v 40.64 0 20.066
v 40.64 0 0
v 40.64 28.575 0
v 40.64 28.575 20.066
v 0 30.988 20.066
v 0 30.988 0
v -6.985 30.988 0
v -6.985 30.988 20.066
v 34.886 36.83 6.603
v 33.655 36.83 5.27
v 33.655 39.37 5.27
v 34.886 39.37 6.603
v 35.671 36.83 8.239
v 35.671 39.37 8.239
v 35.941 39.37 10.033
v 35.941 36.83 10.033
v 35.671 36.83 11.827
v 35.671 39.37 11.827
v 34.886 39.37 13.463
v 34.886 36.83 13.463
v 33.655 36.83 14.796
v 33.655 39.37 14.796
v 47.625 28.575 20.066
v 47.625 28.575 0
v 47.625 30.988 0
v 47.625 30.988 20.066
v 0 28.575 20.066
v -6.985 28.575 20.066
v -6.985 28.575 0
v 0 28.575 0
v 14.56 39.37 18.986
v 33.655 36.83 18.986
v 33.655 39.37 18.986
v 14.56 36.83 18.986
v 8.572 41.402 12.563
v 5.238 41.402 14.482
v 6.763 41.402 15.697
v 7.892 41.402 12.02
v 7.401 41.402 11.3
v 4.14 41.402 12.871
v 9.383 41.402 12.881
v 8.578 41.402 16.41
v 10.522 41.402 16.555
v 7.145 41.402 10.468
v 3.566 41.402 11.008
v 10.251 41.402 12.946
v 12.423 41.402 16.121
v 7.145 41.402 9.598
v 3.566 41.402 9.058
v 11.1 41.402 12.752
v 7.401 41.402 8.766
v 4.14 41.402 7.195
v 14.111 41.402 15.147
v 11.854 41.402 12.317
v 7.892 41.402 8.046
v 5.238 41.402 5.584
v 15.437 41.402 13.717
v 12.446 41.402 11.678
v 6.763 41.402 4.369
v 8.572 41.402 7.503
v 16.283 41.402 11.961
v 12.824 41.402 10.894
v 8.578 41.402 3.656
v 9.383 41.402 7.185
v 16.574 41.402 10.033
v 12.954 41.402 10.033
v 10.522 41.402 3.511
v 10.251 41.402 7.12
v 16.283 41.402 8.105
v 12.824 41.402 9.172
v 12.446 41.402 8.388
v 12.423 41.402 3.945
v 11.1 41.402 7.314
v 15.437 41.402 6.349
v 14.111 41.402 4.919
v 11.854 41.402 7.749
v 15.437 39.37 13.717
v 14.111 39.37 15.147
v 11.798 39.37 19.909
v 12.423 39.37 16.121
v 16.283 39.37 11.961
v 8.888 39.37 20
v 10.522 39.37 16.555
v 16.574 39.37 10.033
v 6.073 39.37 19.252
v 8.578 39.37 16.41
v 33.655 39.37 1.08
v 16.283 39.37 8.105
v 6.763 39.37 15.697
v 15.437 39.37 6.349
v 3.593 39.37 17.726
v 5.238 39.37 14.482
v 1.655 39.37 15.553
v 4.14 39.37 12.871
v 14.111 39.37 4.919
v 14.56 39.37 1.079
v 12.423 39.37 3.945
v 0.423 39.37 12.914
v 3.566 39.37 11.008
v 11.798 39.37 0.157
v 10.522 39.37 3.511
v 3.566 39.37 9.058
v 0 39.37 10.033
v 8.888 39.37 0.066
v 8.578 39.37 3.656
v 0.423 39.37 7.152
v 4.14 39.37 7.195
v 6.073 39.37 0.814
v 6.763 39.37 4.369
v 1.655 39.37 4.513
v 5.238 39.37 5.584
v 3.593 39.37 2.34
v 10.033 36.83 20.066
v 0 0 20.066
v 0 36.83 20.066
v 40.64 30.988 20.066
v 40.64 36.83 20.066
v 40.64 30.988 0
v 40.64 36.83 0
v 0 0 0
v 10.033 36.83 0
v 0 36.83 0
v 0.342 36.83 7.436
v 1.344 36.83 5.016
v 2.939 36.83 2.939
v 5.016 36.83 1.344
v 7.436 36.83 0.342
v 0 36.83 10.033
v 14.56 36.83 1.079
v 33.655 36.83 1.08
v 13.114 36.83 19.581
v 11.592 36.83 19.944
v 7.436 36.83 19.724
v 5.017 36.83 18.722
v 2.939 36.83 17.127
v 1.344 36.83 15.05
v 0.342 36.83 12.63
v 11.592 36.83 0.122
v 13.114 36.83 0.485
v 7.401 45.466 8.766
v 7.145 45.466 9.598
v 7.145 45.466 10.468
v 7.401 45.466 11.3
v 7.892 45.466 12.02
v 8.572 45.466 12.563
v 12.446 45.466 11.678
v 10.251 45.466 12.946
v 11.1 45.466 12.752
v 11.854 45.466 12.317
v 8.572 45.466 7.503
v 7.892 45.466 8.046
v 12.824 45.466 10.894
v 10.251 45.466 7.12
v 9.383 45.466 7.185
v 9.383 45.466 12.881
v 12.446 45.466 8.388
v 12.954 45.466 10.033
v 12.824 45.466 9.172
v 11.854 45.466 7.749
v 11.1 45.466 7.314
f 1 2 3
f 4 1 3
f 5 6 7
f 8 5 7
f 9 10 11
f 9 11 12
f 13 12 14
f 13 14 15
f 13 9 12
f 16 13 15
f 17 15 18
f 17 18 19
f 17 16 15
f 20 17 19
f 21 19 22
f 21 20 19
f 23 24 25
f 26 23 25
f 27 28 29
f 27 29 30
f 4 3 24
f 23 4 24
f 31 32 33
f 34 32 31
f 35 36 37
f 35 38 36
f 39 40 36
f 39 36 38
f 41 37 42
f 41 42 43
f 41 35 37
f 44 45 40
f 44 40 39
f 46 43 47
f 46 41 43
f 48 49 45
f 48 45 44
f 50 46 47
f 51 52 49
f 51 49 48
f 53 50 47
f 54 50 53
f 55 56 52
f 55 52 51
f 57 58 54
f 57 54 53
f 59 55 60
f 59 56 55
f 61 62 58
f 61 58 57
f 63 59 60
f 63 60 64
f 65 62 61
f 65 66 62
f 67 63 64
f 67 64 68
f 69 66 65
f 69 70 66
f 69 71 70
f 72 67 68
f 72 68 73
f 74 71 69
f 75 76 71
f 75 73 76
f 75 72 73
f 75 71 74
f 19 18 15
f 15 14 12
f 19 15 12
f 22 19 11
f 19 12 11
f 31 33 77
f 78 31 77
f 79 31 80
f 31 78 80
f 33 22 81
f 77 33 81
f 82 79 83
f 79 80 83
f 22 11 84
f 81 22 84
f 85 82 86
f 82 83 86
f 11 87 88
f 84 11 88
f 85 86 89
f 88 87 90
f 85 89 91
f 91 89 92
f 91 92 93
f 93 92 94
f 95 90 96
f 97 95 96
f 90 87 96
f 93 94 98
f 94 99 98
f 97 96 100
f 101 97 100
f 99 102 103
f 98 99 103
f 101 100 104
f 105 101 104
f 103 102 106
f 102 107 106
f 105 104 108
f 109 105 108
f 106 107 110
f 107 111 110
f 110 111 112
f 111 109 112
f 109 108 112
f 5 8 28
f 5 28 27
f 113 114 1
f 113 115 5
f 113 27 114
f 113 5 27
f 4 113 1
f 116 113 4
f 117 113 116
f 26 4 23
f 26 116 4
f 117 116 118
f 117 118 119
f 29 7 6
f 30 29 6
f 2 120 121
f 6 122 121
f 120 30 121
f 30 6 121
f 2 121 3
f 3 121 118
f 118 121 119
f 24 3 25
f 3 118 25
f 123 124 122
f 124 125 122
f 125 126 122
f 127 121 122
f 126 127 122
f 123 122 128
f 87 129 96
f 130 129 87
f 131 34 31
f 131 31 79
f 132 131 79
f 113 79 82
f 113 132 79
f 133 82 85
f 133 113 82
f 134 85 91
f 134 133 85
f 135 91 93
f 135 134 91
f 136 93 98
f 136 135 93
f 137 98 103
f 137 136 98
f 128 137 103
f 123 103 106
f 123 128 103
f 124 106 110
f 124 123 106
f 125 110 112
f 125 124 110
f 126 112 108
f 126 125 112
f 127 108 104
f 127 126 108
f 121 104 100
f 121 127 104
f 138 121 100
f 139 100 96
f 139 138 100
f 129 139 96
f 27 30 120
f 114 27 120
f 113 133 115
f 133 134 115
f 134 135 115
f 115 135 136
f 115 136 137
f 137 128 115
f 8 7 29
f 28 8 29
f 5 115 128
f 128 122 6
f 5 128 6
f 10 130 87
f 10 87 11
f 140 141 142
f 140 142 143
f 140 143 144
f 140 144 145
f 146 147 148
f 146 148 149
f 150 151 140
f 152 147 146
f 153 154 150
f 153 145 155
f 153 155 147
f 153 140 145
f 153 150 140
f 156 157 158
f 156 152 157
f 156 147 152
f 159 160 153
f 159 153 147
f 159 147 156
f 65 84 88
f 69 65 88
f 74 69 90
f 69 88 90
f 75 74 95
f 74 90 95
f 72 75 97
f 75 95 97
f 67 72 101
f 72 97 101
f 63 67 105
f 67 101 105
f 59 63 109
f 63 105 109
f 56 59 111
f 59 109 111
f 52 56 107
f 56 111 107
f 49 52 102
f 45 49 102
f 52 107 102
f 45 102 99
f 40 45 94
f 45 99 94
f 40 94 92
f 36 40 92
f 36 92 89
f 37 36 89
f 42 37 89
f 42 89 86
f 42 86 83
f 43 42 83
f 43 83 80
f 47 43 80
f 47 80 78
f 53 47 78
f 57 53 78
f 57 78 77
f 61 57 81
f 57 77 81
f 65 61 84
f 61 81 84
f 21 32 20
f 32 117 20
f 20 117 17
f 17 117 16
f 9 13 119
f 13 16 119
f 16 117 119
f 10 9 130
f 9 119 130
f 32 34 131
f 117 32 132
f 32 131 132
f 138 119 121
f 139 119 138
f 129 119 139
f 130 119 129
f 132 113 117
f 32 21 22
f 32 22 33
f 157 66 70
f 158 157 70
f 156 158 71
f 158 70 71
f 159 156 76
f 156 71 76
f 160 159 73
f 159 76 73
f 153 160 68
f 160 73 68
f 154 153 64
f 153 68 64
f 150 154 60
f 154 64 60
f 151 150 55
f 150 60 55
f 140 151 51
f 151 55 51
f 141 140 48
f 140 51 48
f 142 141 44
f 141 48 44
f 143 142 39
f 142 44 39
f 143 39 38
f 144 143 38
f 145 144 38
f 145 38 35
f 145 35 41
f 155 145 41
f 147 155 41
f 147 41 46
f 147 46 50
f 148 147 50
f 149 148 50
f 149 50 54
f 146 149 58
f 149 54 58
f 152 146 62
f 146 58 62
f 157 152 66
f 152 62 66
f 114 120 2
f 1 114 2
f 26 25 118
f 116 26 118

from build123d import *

# Parameters (mm, degrees)
BOSS_EXTRUDE1_DEPTH = 20.066
BOSS_EXTRUDE2_DEPTH = 2.54
SKETCH3_R           = 6.5405
BOSS_EXTRUDE3_DEPTH = 2.032
SKETCH4_R           = 2.921
BOSS_EXTRUDE4_DEPTH = 4.064


with BuildPart() as part:
    # Sketch1 → Boss-Extrude1 (new body)
    with BuildSketch(Plane.XY):
        Polygon((0, 0), (40.64, 0), (40.64, 28.575), (47.625, 28.575), (47.625, 30.988), (40.64, 30.988), (40.64, 36.83), (0, 36.83), (0, 30.988), (-6.985, 30.988), (-6.985, 28.575), (0, 28.575), align=None)
    extrude(amount=BOSS_EXTRUDE1_DEPTH)

    # Sketch2 → Boss-Extrude2 (add)
    with BuildSketch(Plane(origin=(0, 36.83, 0), x_dir=(1, 0, 0), z_dir=(0, 1, 0))):
        with BuildLine():
            Line((14.560242732, -1.0795), (33.655, -1.0795))
            Line((33.655, -1.0795), (33.655, -5.2705))
            ThreePointArc((33.655, -5.2705), (35.941, -10.033), (33.655, -14.7955))
            Line((33.655, -14.7955), (33.655, -18.9865))
            Line((33.655, -18.9865), (14.560242732, -18.9865))
            ThreePointArc((14.560242732, -18.9865), (0, -10.033), (14.560242732, -1.0795))
        make_face()
    extrude(amount=BOSS_EXTRUDE2_DEPTH)

    # Sketch3 → Boss-Extrude3 (add)
    with BuildSketch(Plane(origin=(0, 39.37, 0), x_dir=(1, 0, 0), z_dir=(0, 1, 0))):
        with Locations((10.033, -10.033)):
            Circle(SKETCH3_R)
    extrude(amount=BOSS_EXTRUDE3_DEPTH)

    # Sketch4 → Boss-Extrude4 (add)
    with BuildSketch(Plane(origin=(0, 41.402, 0), x_dir=(1, 0, 0), z_dir=(0, 1, 0))):
        with Locations((10.033, -10.033)):
            Circle(SKETCH4_R)
    extrude(amount=BOSS_EXTRUDE4_DEPTH)


solid = part.part
